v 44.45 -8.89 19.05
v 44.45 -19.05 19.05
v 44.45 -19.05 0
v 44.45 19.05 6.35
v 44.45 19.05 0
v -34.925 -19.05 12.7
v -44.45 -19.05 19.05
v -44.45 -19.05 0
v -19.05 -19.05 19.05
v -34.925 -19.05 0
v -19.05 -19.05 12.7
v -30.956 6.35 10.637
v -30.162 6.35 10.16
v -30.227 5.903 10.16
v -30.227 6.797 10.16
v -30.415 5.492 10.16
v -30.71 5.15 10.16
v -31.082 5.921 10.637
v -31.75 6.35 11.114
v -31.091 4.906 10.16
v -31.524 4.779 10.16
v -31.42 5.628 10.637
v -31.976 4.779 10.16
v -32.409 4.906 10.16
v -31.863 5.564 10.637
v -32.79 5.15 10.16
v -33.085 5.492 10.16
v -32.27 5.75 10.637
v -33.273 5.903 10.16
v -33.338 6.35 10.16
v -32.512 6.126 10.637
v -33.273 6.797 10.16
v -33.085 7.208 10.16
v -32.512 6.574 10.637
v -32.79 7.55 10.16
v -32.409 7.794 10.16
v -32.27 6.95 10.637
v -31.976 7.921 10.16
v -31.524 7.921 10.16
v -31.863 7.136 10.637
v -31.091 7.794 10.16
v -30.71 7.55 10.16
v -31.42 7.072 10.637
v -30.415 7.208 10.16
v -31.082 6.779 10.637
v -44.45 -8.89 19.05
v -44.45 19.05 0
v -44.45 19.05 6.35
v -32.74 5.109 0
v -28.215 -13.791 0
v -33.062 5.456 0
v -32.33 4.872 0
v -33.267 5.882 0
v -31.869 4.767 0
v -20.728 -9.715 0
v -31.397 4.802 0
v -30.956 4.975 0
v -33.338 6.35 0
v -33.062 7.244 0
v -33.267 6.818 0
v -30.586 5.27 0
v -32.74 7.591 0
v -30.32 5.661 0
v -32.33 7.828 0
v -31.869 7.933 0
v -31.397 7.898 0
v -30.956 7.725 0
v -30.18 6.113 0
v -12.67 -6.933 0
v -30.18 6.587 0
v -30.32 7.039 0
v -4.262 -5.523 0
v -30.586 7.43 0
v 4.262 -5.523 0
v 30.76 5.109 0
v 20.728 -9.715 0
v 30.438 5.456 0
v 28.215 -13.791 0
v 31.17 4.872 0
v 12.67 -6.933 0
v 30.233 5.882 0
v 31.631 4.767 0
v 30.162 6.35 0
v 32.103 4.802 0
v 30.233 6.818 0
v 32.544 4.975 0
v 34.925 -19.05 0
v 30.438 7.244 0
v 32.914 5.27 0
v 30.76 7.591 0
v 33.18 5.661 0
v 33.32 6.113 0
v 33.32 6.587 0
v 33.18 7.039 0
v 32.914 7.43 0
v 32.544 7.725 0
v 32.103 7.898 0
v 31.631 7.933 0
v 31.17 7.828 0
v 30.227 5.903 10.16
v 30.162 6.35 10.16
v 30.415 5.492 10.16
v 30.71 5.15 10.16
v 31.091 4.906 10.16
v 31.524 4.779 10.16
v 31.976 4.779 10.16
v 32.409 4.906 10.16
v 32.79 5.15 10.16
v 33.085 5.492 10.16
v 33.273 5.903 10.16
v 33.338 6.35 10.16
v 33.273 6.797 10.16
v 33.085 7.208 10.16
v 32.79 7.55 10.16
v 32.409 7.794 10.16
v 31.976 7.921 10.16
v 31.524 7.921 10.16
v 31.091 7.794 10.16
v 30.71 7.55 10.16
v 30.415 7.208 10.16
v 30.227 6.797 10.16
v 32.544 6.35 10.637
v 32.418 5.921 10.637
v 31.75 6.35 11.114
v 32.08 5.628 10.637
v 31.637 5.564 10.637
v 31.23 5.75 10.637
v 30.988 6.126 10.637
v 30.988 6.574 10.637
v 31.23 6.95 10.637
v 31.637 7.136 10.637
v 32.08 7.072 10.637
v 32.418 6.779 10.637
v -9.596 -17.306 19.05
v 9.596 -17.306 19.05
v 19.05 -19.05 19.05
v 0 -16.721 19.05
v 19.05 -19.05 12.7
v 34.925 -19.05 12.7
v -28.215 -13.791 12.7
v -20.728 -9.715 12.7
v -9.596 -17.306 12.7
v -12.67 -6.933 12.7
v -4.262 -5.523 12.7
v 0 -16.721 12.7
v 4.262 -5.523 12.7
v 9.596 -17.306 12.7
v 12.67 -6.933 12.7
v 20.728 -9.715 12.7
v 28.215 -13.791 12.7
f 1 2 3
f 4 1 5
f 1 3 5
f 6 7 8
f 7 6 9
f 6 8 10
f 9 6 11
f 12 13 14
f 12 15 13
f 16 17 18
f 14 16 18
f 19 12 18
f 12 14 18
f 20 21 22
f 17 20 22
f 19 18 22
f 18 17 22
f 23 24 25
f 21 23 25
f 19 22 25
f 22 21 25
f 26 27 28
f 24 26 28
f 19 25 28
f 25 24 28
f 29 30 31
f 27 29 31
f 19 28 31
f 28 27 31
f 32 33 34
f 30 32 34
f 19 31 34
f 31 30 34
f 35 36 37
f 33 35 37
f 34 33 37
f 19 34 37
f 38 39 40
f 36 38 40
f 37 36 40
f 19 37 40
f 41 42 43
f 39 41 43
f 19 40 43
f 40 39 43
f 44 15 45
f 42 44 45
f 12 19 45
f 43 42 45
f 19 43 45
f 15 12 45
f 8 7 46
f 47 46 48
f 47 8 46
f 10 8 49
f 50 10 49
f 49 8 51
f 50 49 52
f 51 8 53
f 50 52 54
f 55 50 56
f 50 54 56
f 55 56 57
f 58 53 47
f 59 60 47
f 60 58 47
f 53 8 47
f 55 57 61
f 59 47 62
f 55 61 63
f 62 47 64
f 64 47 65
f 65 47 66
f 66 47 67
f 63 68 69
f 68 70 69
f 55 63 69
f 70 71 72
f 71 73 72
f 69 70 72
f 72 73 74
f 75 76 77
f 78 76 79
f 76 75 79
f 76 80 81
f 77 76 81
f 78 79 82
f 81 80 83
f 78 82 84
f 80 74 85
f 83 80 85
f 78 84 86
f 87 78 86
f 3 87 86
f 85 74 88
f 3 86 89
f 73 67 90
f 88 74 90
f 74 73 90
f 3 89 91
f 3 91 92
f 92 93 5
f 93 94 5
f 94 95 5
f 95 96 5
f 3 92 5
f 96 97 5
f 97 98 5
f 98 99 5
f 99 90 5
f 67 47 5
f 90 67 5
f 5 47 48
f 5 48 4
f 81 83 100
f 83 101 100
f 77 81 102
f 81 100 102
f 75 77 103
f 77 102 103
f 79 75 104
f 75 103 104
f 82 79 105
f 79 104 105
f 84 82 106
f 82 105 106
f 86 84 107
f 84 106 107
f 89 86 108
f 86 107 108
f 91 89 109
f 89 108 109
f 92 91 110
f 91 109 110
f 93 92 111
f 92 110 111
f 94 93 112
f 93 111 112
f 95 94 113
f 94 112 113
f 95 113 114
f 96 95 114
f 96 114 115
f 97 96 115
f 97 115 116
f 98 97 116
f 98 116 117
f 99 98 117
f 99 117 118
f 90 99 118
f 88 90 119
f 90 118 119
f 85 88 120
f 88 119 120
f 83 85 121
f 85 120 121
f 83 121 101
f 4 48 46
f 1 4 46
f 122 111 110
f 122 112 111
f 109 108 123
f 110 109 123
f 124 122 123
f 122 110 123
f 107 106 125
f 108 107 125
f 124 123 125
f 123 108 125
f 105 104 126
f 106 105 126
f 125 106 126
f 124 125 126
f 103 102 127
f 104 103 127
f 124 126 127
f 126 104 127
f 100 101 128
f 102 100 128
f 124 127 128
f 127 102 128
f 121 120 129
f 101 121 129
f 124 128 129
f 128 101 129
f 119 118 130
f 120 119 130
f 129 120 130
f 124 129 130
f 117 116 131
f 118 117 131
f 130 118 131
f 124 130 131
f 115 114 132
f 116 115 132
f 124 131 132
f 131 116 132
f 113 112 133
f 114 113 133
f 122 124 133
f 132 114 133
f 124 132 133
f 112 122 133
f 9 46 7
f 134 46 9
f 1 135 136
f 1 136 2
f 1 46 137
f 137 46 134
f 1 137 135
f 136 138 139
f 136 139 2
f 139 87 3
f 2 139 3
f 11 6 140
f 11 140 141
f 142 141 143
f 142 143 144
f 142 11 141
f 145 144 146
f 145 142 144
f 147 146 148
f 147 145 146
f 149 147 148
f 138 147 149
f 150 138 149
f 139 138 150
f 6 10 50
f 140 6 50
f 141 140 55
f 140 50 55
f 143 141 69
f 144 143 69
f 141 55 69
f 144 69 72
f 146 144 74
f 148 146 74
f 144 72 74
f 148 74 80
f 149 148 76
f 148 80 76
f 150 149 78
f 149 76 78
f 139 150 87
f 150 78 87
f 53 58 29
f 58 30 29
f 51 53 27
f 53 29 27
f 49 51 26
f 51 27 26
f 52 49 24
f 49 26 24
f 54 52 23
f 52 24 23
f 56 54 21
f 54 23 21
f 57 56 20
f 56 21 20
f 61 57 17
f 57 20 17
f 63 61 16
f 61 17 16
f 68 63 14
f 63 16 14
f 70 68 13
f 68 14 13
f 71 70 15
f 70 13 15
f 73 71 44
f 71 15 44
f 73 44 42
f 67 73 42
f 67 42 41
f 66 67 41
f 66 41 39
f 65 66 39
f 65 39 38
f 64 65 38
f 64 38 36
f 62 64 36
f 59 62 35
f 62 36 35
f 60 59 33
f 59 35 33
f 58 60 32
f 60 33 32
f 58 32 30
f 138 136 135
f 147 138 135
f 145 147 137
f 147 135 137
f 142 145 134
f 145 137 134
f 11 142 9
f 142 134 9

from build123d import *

# Parameters (mm, degrees)
F0_W     = 88.9
F0_H     = 38.1
F1_DEPTH = 19.05
F3_DEPTH = 88.9
F5_DEPTH = 25.4
F7_DEPTH = 12.7
F9_D     = 3.175
F9_DEPTH = 10.16
F9_TIP   = 0.9538662327


with BuildPart() as f1:
    # F0 (on Top) → F1 (new body)
    with BuildSketch(Plane.XY):
        Rectangle(F0_W, F0_H)
    extrude(amount=F1_DEPTH)

    # F2 (on face) → F3 (cut)
    with BuildSketch(Plane(origin=(-44.45, 0, 0), x_dir=(0, -1, 0), z_dir=(-1, 0, 0))):
        Polygon((-19.05, 19.05), (-19.05, 6.35), (8.89, 19.05), align=None)
    extrude(amount=-F3_DEPTH, mode=Mode.SUBTRACT)

    # F4 (on face) → F5 (cut)
    with BuildSketch(Plane.XY.offset(19.05)):
        with BuildLine():
            ThreePointArc((19.05, -19.05), (0, -16.7213844667), (-19.05, -19.05))
            Line((-19.05, -19.05), (19.05, -19.05))
        make_face()
    extrude(amount=-F5_DEPTH, mode=Mode.SUBTRACT)

    # F6 (on face) → F7 (cut)
    with BuildSketch(Plane(origin=(0, 0, 0), x_dir=(1, 0, 0), z_dir=(0, 0, -1))):
        with BuildLine():
            ThreePointArc((-34.925, 19.05), (0, 5.3458547425), (34.925, 19.05))
            Line((34.925, 19.05), (19.05, 19.05))
            ThreePointArc((19.05, 19.05), (0, 16.7213844667), (-19.05, 19.05))
            Line((-19.05, 19.05), (-34.925, 19.05))
        make_face()
    extrude(amount=-F7_DEPTH, mode=Mode.SUBTRACT)

    # F9
    with Locations(Plane(origin=(0, 0, 0), x_dir=(1, 0, 0), z_dir=(0, 0, -1))):
        with Locations((31.75, -6.35), (-31.75, -6.35)):
            Hole(F9_D / 2, depth=F9_DEPTH)
            with Locations((0, 0, -(F9_DEPTH + F9_TIP / 2))):  # 118° drill point
                Cone(0, F9_D / 2, F9_TIP, mode=Mode.SUBTRACT)


solid = f1.part
